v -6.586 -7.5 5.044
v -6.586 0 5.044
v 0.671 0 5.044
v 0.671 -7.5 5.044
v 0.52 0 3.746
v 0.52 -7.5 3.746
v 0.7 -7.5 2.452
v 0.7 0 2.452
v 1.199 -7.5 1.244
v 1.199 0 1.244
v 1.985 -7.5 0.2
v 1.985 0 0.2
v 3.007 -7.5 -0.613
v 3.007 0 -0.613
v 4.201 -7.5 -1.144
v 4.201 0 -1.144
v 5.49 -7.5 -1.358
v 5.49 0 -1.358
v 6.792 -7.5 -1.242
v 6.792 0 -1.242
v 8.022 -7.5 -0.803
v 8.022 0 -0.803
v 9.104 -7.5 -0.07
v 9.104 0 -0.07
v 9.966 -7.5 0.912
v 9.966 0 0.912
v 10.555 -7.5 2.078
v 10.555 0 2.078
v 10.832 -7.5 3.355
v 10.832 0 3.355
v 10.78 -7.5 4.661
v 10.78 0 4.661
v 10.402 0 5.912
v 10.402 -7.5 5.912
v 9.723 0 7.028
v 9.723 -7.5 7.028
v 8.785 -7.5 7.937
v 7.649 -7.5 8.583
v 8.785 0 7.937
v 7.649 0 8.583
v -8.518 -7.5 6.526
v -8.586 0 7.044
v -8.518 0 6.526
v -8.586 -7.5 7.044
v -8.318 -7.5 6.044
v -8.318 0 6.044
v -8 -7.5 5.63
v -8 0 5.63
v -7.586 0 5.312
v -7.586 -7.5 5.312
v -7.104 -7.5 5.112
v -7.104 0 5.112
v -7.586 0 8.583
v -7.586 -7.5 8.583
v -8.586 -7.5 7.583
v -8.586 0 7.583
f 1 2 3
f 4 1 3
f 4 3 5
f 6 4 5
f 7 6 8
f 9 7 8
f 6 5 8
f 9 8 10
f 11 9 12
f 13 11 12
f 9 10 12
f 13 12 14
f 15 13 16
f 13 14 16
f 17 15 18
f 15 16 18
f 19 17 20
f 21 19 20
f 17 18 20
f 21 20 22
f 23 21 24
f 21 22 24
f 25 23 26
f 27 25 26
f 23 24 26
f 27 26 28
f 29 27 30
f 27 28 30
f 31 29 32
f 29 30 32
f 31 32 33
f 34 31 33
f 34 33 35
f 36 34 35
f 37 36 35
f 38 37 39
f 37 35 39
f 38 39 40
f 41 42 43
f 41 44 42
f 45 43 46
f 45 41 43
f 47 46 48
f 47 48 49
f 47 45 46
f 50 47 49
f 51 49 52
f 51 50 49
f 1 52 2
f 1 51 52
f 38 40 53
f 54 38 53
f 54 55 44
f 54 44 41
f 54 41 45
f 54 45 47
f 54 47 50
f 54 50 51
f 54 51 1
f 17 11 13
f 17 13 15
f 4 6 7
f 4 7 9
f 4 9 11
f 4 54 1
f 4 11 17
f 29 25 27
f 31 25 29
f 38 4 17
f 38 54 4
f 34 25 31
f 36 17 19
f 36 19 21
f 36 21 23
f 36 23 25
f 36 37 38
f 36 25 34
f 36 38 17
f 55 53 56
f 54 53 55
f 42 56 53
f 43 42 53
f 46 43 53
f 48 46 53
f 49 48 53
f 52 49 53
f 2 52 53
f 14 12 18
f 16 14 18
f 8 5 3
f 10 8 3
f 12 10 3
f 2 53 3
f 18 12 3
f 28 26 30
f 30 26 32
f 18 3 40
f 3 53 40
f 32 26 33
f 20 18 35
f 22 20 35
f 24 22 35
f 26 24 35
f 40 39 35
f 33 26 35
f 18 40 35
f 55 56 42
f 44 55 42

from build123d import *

# Parameters (mm, degrees)
F1_DEPTH = 7.5
F2_R     = 2
F3_SIZE  = 1


with BuildPart() as f1:
    # F0 (on Front) → F1 (new body)
    with BuildSketch(Plane.XZ):
        with BuildLine():
            Line((7.648719, 8.582773), (-8.586255, 8.582773))
            Line((-8.586255, 8.582773), (-8.586255, 5.043917))
            Line((-8.586255, 5.043917), (0.670703, 5.043917))
            ThreePointArc((0.670703, 5.043917), (8.022373, -0.80316), (7.648719, 8.582773))
        make_face()
    extrude(amount=F1_DEPTH)

    # F2
    f2_edges = [f1.edges().sort_by_distance(p)[0] for p in [
        (-8.586255, -3.75, 5.043917),
    ]]
    fillet(f2_edges, radius=F2_R)

    # F3
    f3_edges = [f1.edges().sort_by_distance(p)[0] for p in [
        (-8.586255, -3.75, 8.582773),
    ]]
    chamfer(f3_edges, length=F3_SIZE)


solid = f1.part
